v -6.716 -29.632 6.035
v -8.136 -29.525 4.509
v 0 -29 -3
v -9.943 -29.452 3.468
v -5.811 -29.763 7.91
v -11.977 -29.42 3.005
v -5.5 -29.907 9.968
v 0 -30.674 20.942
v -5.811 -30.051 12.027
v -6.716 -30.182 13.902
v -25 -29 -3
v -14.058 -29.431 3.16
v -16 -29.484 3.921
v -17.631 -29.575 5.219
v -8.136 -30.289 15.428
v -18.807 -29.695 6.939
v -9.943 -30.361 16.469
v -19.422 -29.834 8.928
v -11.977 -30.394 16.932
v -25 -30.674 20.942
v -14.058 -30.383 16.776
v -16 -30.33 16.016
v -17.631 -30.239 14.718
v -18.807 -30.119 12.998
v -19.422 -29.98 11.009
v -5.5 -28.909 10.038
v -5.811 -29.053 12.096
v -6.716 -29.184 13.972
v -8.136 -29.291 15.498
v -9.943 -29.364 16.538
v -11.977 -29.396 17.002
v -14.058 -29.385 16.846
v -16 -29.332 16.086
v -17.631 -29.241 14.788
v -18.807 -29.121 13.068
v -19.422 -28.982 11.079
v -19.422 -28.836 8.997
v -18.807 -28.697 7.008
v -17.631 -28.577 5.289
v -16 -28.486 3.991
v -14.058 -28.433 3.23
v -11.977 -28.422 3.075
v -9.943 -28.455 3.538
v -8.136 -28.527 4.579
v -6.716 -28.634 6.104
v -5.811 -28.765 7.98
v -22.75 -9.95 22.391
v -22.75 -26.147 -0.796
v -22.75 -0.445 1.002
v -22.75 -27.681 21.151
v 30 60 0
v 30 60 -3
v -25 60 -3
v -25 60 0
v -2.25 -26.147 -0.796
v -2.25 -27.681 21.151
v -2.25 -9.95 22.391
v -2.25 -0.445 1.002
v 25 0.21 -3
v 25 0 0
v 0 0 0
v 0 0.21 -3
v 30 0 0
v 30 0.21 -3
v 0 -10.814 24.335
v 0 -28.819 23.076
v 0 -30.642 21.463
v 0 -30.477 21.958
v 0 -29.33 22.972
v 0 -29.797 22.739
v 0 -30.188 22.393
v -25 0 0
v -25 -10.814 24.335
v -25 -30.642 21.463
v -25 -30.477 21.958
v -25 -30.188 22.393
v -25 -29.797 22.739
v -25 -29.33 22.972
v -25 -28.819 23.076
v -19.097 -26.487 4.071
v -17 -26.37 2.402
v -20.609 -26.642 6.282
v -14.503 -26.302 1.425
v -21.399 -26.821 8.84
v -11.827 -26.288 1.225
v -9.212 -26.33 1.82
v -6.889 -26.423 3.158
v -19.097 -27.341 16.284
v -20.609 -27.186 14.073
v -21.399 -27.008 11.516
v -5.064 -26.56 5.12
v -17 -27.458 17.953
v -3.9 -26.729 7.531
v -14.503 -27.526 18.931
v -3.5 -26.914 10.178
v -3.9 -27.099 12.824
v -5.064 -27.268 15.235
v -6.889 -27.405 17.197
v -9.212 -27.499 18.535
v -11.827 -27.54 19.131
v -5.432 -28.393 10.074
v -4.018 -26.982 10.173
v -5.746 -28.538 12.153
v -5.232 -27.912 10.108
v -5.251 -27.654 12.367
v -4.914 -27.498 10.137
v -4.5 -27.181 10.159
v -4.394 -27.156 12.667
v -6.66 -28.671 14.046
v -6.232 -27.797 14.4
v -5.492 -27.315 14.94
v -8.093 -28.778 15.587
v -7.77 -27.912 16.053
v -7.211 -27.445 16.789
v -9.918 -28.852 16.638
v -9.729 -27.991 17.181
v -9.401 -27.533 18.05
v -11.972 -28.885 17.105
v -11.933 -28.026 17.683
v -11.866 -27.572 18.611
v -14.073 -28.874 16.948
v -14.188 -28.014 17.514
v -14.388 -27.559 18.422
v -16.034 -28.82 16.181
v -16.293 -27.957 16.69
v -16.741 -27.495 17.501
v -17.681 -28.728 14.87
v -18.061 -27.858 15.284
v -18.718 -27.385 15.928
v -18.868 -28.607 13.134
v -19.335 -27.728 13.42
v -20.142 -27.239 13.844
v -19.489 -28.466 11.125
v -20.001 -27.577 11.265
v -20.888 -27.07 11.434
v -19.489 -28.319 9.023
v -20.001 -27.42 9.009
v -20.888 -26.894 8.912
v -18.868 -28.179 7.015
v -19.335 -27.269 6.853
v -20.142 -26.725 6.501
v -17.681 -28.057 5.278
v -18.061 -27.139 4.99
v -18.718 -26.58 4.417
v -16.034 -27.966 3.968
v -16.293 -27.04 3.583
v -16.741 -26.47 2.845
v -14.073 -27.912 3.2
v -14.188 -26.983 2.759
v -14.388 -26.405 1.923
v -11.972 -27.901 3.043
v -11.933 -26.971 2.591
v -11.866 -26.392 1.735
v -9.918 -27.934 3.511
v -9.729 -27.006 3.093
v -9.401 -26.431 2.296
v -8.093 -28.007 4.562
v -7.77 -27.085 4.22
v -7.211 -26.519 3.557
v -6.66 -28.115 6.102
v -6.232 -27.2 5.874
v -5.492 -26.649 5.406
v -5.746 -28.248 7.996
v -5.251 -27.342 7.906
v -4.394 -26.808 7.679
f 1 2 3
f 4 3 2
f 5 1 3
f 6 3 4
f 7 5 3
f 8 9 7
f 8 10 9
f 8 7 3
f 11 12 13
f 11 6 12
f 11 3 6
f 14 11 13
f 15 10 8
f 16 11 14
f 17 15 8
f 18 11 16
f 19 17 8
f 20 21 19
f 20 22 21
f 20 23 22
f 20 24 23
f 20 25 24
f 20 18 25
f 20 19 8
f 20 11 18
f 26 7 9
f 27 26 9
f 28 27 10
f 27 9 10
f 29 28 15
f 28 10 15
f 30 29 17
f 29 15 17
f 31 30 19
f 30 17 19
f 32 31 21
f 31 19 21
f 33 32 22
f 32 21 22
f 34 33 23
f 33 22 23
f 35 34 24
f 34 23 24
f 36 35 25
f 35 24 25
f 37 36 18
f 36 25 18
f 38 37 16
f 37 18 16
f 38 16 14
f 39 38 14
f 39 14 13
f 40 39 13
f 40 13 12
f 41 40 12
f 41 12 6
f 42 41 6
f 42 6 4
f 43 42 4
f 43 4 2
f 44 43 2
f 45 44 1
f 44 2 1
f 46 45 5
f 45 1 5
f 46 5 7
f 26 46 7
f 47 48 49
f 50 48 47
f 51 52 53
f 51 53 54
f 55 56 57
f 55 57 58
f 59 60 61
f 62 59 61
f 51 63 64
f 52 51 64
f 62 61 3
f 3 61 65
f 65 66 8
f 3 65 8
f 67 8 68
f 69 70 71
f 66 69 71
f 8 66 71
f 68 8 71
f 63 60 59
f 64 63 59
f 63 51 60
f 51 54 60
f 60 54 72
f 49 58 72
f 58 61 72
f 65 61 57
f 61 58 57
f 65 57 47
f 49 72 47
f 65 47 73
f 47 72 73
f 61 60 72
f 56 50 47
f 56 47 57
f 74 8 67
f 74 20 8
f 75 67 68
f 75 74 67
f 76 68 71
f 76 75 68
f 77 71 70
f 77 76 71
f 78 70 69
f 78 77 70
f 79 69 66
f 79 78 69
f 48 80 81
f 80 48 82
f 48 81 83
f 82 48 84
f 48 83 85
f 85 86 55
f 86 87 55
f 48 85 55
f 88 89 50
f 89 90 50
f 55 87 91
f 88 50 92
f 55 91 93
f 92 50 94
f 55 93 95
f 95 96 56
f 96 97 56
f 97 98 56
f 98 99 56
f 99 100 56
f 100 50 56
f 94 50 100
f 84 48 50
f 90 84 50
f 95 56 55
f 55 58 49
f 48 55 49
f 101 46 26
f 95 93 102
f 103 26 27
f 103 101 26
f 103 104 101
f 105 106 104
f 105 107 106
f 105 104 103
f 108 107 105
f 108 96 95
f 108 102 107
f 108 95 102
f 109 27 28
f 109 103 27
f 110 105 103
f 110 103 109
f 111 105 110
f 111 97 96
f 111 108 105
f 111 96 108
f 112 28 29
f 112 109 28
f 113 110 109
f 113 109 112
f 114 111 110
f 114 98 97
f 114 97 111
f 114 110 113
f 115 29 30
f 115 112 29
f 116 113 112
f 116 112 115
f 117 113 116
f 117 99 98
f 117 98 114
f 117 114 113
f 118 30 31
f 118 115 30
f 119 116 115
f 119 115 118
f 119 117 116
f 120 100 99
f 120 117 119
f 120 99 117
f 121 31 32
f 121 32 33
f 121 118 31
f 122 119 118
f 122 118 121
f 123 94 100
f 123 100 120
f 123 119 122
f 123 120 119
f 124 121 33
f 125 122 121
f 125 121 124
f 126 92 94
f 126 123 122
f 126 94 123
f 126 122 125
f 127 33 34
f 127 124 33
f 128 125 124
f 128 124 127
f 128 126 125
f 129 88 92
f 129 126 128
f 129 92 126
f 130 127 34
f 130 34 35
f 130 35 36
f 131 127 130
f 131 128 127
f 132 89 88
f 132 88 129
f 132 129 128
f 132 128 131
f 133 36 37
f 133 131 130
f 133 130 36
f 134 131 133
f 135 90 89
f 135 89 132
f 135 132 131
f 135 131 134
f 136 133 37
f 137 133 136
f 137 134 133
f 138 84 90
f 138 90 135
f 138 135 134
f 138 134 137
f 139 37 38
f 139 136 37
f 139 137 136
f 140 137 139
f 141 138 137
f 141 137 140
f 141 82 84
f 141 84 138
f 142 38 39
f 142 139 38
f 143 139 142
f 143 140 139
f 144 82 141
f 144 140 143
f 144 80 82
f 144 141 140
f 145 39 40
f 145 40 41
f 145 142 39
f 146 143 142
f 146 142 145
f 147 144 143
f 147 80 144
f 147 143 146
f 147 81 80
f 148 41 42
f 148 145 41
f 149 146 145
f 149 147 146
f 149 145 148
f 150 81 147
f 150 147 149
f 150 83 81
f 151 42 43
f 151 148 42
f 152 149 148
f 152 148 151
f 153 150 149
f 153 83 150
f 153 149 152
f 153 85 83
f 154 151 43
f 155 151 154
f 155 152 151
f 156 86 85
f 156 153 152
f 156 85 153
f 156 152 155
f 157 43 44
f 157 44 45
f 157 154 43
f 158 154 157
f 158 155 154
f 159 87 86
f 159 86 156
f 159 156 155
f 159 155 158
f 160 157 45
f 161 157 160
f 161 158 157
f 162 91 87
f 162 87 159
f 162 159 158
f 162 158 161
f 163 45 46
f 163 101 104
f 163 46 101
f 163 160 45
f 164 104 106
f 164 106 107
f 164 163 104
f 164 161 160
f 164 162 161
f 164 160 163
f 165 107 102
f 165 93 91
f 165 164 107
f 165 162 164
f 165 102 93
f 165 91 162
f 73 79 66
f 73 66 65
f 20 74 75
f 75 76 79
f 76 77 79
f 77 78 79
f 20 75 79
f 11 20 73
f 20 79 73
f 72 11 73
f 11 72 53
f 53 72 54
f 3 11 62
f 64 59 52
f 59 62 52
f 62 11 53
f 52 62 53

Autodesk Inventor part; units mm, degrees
ref_plane "YZ Plane" through (0, 0, 0) normal (1, 0, 0) x (0, 1, 0)
ref_plane "XZ Plane" through (0, 0, 0) normal (0, 1, 0) x (-1, 0, 0)
ref_plane "XY Plane" through (0, 0, 0) normal (0, 0, 1) x (1, 0, 0)
sketch "Skizze1" plane through (0, 0, 0) normal (1, 0, 0) x (0, 1, 0)
  line L0 (60, -3) -> (60, 0)
  line L1 (60, 0) -> (0, 0)
  line L2 (0, 0) -> (-10.8137, 24.3352)
  line L3 (-29, -3) -> (-30.8137, 22.9367)
  line L4 (-30.8137, 22.9367) -> (-10.8137, 24.3352)
  line L5 (-29, -3) -> (60, -3)
  dimension "d52" = 3
  dimension "d56" = 26
  dimension "d57" = 20
  dimension "d88" = 60
  dimension "d89" = 94
  dimension "d90" = 29
extrude "Extrusion1" add sketch "Skizze1" along normal mid plane 50
sketch "Skizze10" plane through (-25, -30.8137, 22.9367) normal (0, -0.0698, 0.9976) x (1, 0, 0)
  line L0 (50, 29.1386) -> (0, 29.1386) projected
  line L1 (25, 29.1386) -> (25, 0) construction
  line L2 (0, 0) -> (50, 0) projected
  line L3 (25, 0) -> (50, 0)
  line L4 (50, 0) -> (50, 29.1386)
  line L5 (50, 29.1386) -> (25, 29.1386)
  line L6 (25, 29.1386) -> (25, 0)
extrude "Extrusion8" cut sketch "Skizze10" against normal through all
sketch "Skizze17" plane through (-25, -30.8137, 22.9367) normal (0, -0.9976, -0.0698) x (1, 0, 0)
  circle A0 centre (12.5, -13) radius 7
  line L0 (25, -26) -> (25, 0) projected
  line L1 (25, 0) -> (0, 0) projected
  point P0 (25, -25.0302)
  point P1 (25, -13)
  point P2 (12.5, 0)
  dimension "d91" = 14
extrude "Extrusion13" cut sketch "Skizze17" against normal blind 3
sketch "Skizze18" plane through (-12.5, -26.9141, 10.1776) normal (0, -0.9976, -0.0698) x (1, 0, 0)
  line L0 (10.25, -11) -> (-10.25, -11)
  line L1 (-10.25, -11) -> (-10.25, 11)
  line L2 (-10.25, 11) -> (10.25, 11)
  line L3 (10.25, 11) -> (10.25, -11)
  line L4 (10.25, -11) -> (-10.25, 11) construction
  line L5 (-10.25, -11) -> (10.25, 11) construction
  line L6 (12.5, -13) -> (12.5, 13) projected
  line L7 (12.5, 13) -> (-12.5, 13) projected
  point P0 (12.5, -12.0302)
  point P1 (0, 0)
  point P2 (0, 0)
  point P3 (12.5, 0)
  point P4 (0, 0)
  point P5 (0, 13)
  dimension "d94" = 20.5
  dimension "d95" = 22
extrude "Extrusion14" cut sketch "Skizze18" against normal up to next
fillet "Rundung18" radius 2 1 edges at (-19.5, -26.9141, 10.1776)
fillet "Rundung19" radius 2 1 edges at (-12.5, -30.8137, 22.9367)
sketch "Skizze19" plane through (25, 0, 0) normal (1, 0, 0) x (0, 0, -1)
  line L0 (0, 0) -> (3, 0.2098) projected
  line L1 (3, 0.2098) -> (3, 60) projected
  line L2 (3, 60) -> (0, 60) projected
  line L3 (0, 60) -> (0, 0) projected
extrude "Extrusion15" add sketch "Skizze19" along normal blind 5
equation "\"G_L\" = 0"
equation "\"G_H\" = 0"
equation "\"G_B\" = 0"
properties part number "Airunit_aufnahme" material "GEDA Polyamid"
